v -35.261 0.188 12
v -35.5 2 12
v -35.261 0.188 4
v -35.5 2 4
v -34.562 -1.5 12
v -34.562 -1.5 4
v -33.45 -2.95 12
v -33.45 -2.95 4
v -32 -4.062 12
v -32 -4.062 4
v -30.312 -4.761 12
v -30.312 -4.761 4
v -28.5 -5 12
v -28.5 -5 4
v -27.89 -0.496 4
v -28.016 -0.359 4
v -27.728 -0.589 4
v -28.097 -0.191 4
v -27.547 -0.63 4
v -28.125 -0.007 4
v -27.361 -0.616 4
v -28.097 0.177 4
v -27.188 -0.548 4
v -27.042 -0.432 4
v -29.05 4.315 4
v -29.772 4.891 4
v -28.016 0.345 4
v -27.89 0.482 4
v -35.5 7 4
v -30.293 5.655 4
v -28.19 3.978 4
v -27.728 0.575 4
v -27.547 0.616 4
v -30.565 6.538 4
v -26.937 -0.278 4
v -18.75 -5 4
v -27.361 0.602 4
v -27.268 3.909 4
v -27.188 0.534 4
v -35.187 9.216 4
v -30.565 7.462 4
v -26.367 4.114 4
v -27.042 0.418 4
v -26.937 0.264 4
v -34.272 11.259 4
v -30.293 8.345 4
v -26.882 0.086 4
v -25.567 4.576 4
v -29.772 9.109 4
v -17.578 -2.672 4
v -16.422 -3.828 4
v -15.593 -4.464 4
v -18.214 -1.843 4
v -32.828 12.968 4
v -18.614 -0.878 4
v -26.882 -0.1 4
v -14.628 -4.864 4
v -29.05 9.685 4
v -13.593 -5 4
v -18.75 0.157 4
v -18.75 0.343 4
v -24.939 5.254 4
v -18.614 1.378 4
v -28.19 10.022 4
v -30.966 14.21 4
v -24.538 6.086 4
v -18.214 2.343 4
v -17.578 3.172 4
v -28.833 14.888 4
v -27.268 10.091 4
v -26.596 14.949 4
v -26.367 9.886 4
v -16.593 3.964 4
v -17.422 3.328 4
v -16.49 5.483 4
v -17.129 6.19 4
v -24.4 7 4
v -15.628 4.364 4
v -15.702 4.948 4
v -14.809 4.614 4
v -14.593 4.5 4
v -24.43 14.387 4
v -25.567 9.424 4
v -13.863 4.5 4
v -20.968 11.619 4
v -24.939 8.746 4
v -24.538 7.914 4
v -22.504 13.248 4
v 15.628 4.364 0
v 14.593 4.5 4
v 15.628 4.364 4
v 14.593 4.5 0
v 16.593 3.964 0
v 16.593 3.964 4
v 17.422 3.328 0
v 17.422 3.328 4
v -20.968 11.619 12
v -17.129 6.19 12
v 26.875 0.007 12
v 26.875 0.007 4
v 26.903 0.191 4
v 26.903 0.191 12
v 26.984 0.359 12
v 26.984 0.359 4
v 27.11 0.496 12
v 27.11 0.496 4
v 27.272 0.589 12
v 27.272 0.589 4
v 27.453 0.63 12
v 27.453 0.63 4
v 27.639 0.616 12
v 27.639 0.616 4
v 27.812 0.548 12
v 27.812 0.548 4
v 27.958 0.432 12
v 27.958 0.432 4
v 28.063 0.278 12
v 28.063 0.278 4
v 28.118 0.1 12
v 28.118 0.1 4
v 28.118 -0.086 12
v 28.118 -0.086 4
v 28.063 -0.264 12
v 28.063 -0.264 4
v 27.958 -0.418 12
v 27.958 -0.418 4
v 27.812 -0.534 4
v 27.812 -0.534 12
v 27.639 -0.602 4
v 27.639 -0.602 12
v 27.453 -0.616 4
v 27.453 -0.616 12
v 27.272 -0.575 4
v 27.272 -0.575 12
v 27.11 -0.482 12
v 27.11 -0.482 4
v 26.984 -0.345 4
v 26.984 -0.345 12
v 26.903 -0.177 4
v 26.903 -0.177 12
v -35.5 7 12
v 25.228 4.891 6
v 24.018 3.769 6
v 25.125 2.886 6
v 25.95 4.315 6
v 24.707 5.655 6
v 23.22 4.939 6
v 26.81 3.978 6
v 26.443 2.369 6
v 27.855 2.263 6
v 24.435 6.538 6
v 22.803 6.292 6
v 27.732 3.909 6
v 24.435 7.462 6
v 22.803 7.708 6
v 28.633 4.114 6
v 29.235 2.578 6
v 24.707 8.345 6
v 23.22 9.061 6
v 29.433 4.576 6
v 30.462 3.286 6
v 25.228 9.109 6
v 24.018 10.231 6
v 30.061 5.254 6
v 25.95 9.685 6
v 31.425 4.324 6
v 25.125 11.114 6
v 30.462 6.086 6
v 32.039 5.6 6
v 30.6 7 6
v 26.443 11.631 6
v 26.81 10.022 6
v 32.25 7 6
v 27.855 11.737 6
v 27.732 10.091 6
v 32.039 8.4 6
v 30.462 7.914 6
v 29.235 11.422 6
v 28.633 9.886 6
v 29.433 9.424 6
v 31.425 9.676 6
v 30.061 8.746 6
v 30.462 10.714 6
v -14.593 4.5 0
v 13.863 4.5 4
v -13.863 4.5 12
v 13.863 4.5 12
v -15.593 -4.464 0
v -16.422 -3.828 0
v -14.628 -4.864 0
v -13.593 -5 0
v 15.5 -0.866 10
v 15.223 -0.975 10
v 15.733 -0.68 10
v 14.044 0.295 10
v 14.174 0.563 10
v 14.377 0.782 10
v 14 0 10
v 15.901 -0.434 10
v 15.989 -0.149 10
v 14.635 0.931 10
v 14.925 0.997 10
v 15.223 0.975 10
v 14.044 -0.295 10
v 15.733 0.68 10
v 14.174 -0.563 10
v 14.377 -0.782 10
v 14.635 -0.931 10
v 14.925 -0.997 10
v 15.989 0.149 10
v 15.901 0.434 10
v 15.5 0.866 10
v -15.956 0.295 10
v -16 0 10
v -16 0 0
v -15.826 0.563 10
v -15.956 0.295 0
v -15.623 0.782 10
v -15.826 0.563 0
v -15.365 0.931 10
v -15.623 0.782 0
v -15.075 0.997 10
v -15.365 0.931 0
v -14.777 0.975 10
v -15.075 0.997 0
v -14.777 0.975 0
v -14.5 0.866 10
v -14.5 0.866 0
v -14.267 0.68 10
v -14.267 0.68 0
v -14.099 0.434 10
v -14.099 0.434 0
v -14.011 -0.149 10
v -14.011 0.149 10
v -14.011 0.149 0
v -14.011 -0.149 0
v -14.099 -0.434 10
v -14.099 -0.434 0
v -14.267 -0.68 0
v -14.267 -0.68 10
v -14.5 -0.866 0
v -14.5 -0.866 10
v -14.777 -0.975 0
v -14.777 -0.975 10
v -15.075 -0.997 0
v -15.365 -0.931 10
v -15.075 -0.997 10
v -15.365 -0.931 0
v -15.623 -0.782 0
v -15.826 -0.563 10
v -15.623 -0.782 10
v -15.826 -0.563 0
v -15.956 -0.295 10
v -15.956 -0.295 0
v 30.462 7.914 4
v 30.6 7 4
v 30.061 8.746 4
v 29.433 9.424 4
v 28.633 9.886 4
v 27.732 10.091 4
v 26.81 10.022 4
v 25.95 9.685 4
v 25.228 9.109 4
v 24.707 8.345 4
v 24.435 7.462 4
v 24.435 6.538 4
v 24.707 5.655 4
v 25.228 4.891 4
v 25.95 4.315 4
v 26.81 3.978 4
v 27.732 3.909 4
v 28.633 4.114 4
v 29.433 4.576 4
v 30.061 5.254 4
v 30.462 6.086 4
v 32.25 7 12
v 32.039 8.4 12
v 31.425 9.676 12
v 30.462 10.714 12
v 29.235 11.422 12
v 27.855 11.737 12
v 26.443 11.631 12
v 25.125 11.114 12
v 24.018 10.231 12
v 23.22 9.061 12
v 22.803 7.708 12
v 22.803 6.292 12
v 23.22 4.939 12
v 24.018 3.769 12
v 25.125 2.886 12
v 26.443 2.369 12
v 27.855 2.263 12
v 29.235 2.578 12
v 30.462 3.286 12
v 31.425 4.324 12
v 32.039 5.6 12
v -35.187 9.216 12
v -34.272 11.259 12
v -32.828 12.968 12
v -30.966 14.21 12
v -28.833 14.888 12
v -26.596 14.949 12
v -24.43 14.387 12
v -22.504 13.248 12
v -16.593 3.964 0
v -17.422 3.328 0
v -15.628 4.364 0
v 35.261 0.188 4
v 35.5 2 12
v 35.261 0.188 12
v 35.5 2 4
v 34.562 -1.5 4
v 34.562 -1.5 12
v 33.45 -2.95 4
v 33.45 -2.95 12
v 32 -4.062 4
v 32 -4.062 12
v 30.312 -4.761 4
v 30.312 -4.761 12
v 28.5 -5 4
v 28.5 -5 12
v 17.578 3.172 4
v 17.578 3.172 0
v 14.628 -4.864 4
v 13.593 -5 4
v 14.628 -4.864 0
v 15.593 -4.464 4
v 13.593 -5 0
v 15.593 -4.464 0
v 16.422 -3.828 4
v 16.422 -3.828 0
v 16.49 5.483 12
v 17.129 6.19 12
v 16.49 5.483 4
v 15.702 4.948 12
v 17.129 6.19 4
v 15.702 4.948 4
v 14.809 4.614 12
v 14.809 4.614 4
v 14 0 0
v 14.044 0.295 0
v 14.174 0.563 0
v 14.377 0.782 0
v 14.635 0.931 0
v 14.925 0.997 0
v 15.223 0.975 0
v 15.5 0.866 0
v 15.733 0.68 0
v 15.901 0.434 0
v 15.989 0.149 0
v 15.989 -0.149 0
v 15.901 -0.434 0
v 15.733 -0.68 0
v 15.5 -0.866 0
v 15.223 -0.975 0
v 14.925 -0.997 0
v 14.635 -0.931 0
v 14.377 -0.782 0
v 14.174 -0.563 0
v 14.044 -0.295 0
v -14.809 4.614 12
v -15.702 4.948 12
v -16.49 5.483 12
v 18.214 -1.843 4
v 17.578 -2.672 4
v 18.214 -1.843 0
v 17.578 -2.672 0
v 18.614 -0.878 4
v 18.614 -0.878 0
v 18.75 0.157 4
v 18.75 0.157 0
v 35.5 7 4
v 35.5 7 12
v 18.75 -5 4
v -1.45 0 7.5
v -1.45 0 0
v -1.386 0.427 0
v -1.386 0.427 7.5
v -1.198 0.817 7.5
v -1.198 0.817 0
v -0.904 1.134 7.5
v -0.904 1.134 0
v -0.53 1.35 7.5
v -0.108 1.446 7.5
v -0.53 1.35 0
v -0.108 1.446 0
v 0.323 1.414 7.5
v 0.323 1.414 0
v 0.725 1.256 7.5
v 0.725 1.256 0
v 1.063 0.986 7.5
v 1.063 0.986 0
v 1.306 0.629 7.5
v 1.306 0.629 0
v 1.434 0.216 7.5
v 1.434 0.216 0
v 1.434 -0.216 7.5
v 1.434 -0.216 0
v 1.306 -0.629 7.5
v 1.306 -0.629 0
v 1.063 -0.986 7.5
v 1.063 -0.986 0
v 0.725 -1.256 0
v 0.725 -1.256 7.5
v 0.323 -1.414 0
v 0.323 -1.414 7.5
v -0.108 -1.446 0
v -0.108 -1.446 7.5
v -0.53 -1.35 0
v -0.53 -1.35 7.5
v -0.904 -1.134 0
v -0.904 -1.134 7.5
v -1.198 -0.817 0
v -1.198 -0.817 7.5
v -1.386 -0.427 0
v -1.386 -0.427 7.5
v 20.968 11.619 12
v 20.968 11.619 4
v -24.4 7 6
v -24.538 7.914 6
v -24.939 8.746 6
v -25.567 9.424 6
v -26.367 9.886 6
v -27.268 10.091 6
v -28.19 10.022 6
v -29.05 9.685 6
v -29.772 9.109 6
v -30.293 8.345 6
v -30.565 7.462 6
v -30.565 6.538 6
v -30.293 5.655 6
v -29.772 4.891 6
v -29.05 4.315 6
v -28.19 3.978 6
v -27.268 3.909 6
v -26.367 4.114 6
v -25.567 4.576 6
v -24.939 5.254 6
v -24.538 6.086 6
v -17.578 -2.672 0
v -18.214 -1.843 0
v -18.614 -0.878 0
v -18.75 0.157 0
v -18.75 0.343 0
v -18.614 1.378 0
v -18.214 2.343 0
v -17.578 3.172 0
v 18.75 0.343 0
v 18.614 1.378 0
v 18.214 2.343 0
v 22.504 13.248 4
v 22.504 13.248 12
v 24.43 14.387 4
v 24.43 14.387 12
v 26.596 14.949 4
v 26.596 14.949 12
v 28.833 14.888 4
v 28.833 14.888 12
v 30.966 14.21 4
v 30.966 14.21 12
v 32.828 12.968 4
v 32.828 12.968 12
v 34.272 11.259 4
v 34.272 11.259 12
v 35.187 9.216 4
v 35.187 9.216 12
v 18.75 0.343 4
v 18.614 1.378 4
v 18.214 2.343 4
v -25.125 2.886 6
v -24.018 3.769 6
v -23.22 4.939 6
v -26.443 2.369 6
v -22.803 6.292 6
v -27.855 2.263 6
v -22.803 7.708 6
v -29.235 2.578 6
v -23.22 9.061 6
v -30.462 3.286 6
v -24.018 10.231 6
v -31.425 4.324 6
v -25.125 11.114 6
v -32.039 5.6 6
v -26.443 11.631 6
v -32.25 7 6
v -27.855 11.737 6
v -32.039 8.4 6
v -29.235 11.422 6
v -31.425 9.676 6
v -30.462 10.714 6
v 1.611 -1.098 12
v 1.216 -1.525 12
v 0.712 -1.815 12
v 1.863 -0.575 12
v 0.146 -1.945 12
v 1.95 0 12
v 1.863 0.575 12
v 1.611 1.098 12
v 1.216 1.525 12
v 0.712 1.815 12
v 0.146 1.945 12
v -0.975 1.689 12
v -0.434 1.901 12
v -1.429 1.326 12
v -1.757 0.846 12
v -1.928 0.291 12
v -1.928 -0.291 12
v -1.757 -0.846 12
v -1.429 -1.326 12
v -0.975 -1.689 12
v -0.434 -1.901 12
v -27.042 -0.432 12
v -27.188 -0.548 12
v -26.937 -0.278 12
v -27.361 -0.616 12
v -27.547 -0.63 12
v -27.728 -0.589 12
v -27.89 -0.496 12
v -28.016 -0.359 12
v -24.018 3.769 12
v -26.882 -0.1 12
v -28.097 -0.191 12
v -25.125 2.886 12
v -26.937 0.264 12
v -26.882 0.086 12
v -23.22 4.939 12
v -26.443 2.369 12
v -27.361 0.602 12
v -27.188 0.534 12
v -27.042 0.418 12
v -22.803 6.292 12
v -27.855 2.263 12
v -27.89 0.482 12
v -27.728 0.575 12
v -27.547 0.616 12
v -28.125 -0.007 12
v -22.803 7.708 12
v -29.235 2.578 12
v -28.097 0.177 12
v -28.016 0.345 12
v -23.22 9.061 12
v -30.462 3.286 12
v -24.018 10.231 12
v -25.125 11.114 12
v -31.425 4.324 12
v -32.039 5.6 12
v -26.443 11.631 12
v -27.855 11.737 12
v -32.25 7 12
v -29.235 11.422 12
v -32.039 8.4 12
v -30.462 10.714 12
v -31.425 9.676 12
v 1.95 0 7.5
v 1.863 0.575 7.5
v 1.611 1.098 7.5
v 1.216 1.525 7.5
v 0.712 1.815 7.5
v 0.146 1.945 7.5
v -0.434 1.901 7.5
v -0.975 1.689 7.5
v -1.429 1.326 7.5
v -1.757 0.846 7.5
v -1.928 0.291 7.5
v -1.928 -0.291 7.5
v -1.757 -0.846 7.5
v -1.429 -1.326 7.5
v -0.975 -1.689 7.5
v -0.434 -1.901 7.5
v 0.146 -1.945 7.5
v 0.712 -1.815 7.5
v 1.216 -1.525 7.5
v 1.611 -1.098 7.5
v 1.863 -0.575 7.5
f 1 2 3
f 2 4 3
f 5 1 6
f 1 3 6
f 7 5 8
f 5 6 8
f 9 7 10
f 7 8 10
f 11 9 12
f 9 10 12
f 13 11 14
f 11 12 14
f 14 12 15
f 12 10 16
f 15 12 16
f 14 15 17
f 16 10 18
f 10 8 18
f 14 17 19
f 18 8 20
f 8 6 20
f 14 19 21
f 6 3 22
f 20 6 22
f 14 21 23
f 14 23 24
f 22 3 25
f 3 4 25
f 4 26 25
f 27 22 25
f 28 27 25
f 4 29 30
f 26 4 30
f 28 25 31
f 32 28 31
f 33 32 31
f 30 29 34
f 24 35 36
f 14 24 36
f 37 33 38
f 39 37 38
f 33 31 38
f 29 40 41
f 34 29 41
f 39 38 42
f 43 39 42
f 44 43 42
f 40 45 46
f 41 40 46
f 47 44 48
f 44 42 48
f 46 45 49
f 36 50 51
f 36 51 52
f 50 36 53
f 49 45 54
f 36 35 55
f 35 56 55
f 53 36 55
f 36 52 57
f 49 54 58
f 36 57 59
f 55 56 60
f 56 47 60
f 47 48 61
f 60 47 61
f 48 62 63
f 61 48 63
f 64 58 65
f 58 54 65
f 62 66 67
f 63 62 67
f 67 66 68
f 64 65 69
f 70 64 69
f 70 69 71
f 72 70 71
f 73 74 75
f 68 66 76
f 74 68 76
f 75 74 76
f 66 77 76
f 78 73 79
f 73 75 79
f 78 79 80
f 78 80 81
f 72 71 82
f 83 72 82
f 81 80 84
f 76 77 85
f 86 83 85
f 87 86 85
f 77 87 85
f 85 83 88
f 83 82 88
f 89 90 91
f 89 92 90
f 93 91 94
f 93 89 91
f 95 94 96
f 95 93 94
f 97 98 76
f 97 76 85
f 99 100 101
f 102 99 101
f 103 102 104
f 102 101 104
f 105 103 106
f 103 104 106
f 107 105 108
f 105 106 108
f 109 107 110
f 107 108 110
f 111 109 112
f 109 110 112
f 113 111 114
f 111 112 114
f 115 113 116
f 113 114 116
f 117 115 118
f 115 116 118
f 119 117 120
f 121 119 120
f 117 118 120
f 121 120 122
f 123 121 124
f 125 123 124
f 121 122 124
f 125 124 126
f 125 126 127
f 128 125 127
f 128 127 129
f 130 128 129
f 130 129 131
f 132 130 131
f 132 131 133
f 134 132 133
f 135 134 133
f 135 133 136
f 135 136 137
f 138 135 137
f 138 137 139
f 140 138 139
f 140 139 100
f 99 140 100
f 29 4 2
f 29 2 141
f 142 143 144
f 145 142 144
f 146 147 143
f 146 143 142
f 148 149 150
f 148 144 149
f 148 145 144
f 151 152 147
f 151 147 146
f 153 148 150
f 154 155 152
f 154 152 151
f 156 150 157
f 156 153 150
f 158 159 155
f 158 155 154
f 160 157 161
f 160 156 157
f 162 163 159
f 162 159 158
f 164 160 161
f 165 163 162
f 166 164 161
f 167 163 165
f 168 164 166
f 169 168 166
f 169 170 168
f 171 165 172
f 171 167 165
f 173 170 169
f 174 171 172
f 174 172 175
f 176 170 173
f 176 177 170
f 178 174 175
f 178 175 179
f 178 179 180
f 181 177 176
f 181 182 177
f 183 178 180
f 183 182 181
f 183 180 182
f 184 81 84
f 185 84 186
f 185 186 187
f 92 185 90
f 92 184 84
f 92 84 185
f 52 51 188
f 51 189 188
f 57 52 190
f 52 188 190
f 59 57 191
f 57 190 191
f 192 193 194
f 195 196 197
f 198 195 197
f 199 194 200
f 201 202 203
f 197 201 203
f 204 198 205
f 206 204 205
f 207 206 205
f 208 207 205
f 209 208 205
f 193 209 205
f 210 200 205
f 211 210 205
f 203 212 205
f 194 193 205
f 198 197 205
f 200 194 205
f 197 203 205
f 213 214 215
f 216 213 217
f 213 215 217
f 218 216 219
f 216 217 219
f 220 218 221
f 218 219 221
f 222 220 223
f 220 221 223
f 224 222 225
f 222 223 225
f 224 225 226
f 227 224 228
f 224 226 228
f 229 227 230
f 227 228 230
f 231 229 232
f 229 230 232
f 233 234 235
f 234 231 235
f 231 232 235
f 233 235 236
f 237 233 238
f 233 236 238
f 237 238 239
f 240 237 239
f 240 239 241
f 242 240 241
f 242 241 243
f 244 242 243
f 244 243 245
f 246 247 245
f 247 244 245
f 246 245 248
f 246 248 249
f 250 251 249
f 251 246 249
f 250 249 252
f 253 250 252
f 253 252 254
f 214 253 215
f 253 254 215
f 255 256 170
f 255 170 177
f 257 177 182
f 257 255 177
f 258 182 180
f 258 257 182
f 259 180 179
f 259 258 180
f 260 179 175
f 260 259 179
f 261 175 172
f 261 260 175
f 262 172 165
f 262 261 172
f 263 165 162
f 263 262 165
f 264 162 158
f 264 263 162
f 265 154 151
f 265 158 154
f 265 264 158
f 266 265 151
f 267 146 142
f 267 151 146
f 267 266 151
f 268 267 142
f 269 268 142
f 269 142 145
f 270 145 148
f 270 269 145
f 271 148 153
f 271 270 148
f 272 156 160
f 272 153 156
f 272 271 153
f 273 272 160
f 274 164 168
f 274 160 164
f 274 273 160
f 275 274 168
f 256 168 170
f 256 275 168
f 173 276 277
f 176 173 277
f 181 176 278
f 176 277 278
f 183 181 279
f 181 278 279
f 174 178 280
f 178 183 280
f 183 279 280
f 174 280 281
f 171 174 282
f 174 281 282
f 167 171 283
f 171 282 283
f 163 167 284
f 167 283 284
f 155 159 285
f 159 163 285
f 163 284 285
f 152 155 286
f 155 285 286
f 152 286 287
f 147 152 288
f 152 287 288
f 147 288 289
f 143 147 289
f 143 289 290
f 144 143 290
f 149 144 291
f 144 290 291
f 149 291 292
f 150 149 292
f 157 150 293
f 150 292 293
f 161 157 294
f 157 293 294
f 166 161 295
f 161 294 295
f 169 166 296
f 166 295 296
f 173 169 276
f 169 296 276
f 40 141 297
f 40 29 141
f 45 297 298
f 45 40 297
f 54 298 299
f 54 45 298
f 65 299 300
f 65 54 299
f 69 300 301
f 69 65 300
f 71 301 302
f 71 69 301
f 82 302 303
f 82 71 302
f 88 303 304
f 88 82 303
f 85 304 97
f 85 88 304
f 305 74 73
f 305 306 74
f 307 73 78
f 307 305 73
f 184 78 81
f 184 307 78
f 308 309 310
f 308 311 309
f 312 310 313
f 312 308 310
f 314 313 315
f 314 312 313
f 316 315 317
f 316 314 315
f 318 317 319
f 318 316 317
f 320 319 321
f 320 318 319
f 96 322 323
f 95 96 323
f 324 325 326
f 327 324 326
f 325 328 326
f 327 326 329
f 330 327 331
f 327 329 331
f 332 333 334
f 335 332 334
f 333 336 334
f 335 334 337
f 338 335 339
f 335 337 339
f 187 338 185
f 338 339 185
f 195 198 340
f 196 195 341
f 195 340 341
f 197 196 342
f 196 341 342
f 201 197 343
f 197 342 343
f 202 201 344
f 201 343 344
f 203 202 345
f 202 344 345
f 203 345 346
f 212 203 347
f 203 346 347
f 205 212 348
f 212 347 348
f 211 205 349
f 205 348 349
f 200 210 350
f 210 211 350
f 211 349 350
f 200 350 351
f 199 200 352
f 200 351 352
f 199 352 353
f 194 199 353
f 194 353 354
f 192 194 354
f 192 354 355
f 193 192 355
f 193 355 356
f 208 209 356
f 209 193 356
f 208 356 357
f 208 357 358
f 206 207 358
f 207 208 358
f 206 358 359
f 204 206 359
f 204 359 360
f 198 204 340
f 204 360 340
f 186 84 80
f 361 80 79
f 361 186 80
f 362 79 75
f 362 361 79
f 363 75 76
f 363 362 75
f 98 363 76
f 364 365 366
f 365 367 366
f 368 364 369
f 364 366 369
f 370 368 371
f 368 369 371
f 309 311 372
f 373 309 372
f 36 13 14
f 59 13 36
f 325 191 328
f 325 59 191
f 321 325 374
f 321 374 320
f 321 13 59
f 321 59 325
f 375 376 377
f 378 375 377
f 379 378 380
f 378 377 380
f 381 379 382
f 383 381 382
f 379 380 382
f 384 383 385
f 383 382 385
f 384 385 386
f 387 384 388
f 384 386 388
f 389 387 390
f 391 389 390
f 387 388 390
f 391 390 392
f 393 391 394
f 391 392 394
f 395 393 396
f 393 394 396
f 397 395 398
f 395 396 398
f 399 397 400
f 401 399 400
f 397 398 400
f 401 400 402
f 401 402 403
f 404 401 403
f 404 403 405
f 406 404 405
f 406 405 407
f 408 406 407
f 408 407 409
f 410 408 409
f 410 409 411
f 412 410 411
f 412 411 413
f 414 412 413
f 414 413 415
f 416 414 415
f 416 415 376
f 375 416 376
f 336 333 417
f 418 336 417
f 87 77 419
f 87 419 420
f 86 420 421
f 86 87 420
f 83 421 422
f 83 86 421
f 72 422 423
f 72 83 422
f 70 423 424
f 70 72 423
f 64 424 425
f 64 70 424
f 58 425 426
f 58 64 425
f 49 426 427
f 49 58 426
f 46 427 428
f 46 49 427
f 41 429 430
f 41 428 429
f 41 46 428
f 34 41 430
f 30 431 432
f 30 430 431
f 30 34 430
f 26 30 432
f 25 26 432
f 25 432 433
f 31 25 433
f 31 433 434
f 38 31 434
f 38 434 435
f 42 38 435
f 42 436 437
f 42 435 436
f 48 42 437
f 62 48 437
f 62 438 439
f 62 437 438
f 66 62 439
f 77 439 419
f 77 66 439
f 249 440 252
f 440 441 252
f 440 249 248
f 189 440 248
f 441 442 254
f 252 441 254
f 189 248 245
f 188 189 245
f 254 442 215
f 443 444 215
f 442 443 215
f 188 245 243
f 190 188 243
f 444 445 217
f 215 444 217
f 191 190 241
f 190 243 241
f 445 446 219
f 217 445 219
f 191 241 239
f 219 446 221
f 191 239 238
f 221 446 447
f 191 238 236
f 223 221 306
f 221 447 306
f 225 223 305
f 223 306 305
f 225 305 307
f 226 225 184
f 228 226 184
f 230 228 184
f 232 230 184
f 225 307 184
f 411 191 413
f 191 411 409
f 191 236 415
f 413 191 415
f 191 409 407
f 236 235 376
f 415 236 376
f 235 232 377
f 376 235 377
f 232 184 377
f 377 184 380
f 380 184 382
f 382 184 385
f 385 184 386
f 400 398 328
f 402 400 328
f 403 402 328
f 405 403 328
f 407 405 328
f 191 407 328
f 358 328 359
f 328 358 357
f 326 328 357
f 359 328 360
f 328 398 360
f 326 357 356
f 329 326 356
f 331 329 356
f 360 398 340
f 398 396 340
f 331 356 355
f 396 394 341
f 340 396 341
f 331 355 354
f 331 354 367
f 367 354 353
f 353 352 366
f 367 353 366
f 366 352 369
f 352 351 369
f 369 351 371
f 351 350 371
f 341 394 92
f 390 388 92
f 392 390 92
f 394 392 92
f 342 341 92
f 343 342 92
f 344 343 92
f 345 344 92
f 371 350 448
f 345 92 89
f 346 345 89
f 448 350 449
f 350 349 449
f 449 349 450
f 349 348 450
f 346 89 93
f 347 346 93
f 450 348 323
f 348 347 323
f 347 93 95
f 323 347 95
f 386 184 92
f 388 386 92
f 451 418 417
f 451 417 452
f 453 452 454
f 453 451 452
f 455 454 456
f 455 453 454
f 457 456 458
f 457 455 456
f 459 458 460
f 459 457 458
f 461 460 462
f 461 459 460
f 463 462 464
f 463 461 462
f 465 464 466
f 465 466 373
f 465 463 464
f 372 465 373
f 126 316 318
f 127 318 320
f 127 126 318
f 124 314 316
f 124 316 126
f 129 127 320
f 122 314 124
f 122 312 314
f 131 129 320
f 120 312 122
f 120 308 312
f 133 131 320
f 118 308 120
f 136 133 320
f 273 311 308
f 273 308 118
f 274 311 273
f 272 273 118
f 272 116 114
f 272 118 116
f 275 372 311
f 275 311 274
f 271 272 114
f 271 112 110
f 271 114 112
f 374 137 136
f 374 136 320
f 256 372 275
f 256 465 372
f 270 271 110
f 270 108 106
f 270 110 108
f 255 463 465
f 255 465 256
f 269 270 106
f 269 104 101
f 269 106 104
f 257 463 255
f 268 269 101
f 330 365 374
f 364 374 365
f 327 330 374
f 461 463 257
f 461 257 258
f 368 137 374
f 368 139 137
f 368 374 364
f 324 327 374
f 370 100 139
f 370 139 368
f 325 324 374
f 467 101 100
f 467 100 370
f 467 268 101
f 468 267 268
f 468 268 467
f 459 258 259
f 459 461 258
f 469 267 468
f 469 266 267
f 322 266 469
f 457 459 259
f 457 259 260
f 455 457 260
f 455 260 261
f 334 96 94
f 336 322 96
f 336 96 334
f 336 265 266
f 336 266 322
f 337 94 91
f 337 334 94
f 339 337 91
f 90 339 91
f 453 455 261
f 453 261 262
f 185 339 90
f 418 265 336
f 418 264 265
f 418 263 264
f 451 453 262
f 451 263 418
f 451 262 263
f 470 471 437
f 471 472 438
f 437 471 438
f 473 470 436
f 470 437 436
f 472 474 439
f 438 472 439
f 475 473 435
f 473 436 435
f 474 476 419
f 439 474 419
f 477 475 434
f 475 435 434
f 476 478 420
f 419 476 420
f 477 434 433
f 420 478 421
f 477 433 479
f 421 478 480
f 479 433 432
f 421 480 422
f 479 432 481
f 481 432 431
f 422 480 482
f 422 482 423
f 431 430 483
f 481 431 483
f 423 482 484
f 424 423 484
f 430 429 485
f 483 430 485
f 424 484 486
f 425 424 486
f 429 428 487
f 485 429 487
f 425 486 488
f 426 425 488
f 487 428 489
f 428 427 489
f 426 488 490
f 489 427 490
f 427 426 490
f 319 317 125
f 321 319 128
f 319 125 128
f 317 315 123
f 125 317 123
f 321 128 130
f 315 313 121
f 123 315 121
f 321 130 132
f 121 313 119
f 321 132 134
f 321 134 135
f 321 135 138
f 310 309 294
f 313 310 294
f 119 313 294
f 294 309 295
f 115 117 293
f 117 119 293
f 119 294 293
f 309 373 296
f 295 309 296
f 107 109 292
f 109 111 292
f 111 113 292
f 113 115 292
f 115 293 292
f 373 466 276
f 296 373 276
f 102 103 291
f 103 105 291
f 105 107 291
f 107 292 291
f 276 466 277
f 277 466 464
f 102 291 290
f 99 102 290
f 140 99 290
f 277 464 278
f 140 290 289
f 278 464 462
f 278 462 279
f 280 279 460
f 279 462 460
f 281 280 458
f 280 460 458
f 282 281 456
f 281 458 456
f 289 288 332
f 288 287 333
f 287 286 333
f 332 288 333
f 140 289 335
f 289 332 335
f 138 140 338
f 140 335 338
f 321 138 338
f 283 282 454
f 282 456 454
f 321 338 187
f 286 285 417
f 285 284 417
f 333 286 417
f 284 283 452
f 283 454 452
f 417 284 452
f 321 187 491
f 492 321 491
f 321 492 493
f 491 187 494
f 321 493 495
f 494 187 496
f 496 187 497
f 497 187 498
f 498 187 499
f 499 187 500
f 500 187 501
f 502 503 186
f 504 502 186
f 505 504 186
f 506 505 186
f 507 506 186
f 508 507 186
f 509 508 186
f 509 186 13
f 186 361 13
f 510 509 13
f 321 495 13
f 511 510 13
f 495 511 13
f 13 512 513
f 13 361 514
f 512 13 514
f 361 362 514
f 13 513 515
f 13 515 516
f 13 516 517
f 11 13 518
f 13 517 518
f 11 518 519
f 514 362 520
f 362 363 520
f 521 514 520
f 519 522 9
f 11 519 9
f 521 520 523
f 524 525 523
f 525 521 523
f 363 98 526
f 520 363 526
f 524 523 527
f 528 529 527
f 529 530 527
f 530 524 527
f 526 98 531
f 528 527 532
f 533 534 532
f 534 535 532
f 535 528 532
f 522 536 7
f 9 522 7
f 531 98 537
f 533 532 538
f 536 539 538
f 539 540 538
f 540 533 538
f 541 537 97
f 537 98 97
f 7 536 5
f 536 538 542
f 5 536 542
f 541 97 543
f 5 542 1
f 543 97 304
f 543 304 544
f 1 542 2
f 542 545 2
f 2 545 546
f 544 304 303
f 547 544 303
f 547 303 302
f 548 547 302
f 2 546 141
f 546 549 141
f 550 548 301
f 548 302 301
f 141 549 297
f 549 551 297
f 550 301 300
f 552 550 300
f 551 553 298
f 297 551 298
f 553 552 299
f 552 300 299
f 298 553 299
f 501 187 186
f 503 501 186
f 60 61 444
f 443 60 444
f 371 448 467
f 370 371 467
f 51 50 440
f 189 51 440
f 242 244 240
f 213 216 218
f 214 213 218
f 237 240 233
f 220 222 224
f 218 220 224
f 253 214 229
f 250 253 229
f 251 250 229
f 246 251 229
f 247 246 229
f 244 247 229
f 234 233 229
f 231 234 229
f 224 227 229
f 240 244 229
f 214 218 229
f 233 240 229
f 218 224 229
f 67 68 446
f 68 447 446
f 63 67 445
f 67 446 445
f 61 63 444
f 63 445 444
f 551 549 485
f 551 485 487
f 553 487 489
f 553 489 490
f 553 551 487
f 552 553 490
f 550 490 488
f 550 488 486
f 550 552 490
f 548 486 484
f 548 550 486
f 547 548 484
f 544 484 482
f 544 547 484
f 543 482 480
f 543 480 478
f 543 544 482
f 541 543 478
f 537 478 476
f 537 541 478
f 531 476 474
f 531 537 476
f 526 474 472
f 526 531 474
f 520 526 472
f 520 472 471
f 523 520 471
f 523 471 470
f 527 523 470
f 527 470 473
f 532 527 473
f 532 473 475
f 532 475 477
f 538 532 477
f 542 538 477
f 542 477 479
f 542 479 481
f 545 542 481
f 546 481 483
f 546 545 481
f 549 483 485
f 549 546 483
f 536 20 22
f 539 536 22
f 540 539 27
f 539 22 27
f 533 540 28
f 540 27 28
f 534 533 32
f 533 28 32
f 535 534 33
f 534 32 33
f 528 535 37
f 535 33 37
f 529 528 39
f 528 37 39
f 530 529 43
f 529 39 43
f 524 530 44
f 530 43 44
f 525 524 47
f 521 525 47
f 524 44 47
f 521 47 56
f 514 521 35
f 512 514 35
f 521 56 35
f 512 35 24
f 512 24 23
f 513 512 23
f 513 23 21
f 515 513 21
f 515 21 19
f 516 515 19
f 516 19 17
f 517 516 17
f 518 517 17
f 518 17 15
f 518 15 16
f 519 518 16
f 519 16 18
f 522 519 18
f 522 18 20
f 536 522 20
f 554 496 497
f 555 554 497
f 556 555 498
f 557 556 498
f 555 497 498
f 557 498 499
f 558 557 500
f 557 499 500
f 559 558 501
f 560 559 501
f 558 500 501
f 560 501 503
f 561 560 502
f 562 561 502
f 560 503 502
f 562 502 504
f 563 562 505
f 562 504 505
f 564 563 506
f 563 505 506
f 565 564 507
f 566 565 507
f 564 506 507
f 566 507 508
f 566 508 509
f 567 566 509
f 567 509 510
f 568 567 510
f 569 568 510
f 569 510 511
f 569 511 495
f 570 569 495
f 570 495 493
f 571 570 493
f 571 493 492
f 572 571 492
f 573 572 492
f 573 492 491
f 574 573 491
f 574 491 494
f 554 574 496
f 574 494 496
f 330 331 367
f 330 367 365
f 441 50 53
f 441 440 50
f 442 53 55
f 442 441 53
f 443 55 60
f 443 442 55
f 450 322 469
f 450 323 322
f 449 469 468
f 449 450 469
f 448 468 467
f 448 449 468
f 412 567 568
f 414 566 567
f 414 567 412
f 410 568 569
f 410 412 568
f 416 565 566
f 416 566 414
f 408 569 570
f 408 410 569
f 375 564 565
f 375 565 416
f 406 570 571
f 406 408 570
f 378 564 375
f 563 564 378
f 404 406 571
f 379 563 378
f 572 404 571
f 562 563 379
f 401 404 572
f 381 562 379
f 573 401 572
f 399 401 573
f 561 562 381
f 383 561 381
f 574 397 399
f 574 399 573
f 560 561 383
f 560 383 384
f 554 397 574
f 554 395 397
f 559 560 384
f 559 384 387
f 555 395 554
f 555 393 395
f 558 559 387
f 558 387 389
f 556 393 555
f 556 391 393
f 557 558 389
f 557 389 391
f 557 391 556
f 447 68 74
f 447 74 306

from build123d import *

# Parameters (mm, degrees)
SKETCH1_W                     = 68.5
SKETCH1_H                     = 7
BOSS_EXTRUDE1_DEPTH           = 12
BOSS_EXTRUDE1_DEPTH_BACK      = 12
SKETCH2_W                     = 15.5
SKETCH2_H                     = 6.3
CUT_EXTRUDE1_DEPTH            = 8
SKETCH3_W                     = 13.5
SKETCH3_H                     = 8.85
BOSS_EXTRUDE2_DEPTH           = 10
SKETCH4_R                     = 3.1
CUT_EXTRUDE2_DEPTH            = 22
CUT_EXTRUDE2_DEPTH_BACK       = 24.5
CUT_EXTRUDE3_DEPTH            = 5
SKETCH6_R                     = 6.2
CUT_EXTRUDE4_DEPTH            = 1
MIRROR2_COPY_1_SKETCH_R       = 6.2
MIRROR2_COPY_1_DEPTH          = 1
SKETCH7_W                     = 13.5
SKETCH7_H                     = 8.5
CUT_EXTRUDE5_DEPTH            = 1
MIRROR5_COPY_1_SKETCH_W       = 13.5
MIRROR5_COPY_1_SKETCH_H       = 8.5
MIRROR5_COPY_1_DEPTH          = 1
TAP_DRILL_FOR_M2_TAP1_D       = 1.6
CUT_EXTRUDE6_DEPTH            = 27
SKETCH12_W                    = 73.606041854
SKETCH12_H                    = 30.436261762
CUT_EXTRUDE7_DEPTH            = 22
F_2_0_2_DIAMETER_HOLE2_D      = 2
F_2_0_2_DIAMETER_HOLE2_DEPTH  = 16
F_2_0_2_DIAMETER_HOLE2_TIP    = 0.600860619
F_2_0_2_DIAMETER_HOLE1_D      = 2
F_2_0_2_DIAMETER_HOLE1_DEPTH  = 16
F_2_0_2_DIAMETER_HOLE1_TIP    = 0.600860619
ESQUISSE5_R                   = 3.1
BOSS_EXTRU_1_DEPTH            = 1
ESQUISSE6_R                   = 4.75
ENL_V_MAT_EXTRU_1_DEPTH       = 6
ESQUISSE7_R                   = 0.8
BOSS_EXTRU_2_DEPTH            = 8.85
ESQUISSE9_R                   = 0.6
ENL_V_MAT_EXTRU_2_DEPTH       = 13
BOSS_EXTRUDE3_DEPTH           = 1.5
SKETCH24_W                    = 17.102440496
SKETCH24_H                    = 20.071516443
CUT_EXTRUDE8_DEPTH            = 0.85
BOSS_EXTRUDE4_DEPTH           = 8
M2_5_CLEARANCE_HOLE1_D        = 2.9
M2_5_CLEARANCE_HOLE1_DEPTH    = 24
M2_5_CLEARANCE_HOLE1_TIP      = 0.871247898
SKETCH26_W                    = 37.5
SKETCH26_H                    = 12
BOSS_EXTRUDE6_DEPTH           = 1
SKETCH27_R                    = 1.95
CUT_EXTRUDE9_DEPTH            = 4.5
CHAMFER2_SIZE                 = 2.5
SKETCH28_R                    = 1
BOSS_EXTRUDE7_DEPTH           = 2
SKETCH29_R                    = 8
SKETCH29_R_2                  = 4.75
BOSS_EXTRUDE8_DEPTH           = 8
SKETCH31_W                    = 1.25
SKETCH31_H                    = 12
BOSS_EXTRUDE9_DEPTH           = 8
FILLET1_R                     = 7
BOSS_EXTRUDE10_DEPTH          = 8
FILLET2_R                     = 4
TAP_DRILL_FOR_M1_6_TAP1_D     = 1.25
TAP_DRILL_FOR_M1_6_TAP1_DEPTH = 30.5
CHAMFER3_SIZE                 = 3.5
FILLET3_R                     = 4


with BuildPart() as part:
    # Sketch1 → Boss-Extrude1 (new body, two sides)
    with BuildSketch(Plane.XY) as boss_extrude1_sk:
        Rectangle(SKETCH1_W, SKETCH1_H)
    extrude(amount=BOSS_EXTRUDE1_DEPTH)
    extrude(boss_extrude1_sk.sketch, amount=-BOSS_EXTRUDE1_DEPTH_BACK)

    # Sketch2 → Cut-Extrude1 (cut, through all)
    with BuildSketch(Plane(origin=(0, 3.5, 0), x_dir=(1, 0, 0), z_dir=(0, 1, 0))):
        with Locations((-26.5, 0)):
            Rectangle(SKETCH2_W, SKETCH2_H)
        with Locations((26.5, 0)):
            Rectangle(SKETCH2_W, SKETCH2_H)
    extrude(amount=-CUT_EXTRUDE1_DEPTH, mode=Mode.SUBTRACT)

    # Sketch3 → Boss-Extrude2 (add)
    with BuildSketch(Plane(origin=(0, 3.5, 0), x_dir=(1, 0, 0), z_dir=(0, 1, 0))):
        with Locations((-27.5, 7.575)):
            Rectangle(SKETCH3_W, SKETCH3_H)
        with Locations((-27.5, -7.575)):
            Rectangle(SKETCH3_W, SKETCH3_H)
        with Locations((27.5, -7.575)):
            Rectangle(SKETCH3_W, SKETCH3_H)
        with Locations((27.5, 7.575)):
            Rectangle(SKETCH3_W, SKETCH3_H)
    extrude(amount=BOSS_EXTRUDE2_DEPTH)

    # Sketch4 → Cut-Extrude2 (cut, two sides)
    with BuildSketch(Plane.XY) as cut_extrude2_sk:
        with Locations((-27.5, 7)):
            Circle(SKETCH4_R)
        with Locations((27.5, 7)):
            Circle(SKETCH4_R)
    extrude(amount=CUT_EXTRUDE2_DEPTH, mode=Mode.SUBTRACT)
    extrude(cut_extrude2_sk.sketch, amount=-CUT_EXTRUDE2_DEPTH_BACK, mode=Mode.SUBTRACT)

    # Sketch5 → Cut-Extrude3 (cut)
    with BuildSketch(Plane.XY):
        Polygon((15, 3.5), (36.256888292, -2.195766051), (36.256888292, 13.5), (15, 13.5), align=None)
    extrude(amount=-CUT_EXTRUDE3_DEPTH, mode=Mode.SUBTRACT)

    # Sketch6 → Cut-Extrude4 (cut)
    with BuildSketch(Plane.XY.offset(12)):
        with Locations((27.5, 7)):
            Circle(SKETCH6_R)
    cut_extrude4 = extrude(amount=-CUT_EXTRUDE4_DEPTH, mode=Mode.SUBTRACT)

    # Mirror1: Cut-Extrude4 across plane
    add(cut_extrude4.mirror(Plane.XY), mode=Mode.SUBTRACT)

    # Mirror2: Cut-Extrude4 across plane
    add(cut_extrude4.mirror(Plane(origin=(0, 0, 0), x_dir=(0, 0, 1), z_dir=(1, 0, 0))), mode=Mode.SUBTRACT)

    # Mirror2 copy 1 sketch → Mirror2 copy 1 (cut)
    with BuildSketch(Plane(origin=(0, 0, -12), x_dir=(-1, 0, 0), z_dir=(0, 0, -1))):
        with Locations((27.5, 7)):
            Circle(MIRROR2_COPY_1_SKETCH_R)
    extrude(amount=-MIRROR2_COPY_1_DEPTH, mode=Mode.SUBTRACT)

    # Sketch7 → Cut-Extrude5 (cut)
    with BuildSketch(Plane.XY.offset(12)):
        with Locations((-27.5, 9.25)):
            Rectangle(SKETCH7_W, SKETCH7_H)
    cut_extrude5 = extrude(amount=-CUT_EXTRUDE5_DEPTH, mode=Mode.SUBTRACT)

    # Mirror3: Cut-Extrude5 across plane
    add(cut_extrude5.mirror(Plane(origin=(0, 0, 0), x_dir=(0, 0, 1), z_dir=(1, 0, 0))), mode=Mode.SUBTRACT)

    # Mirror5: Cut-Extrude5 across plane
    add(cut_extrude5.mirror(Plane.XY), mode=Mode.SUBTRACT)

    # Mirror5 copy 1 sketch → Mirror5 copy 1 (cut)
    with BuildSketch(Plane(origin=(0, 0, -12), x_dir=(-1, 0, 0), z_dir=(0, 0, -1))):
        with Locations((-27.5, 9.25)):
            Rectangle(MIRROR5_COPY_1_SKETCH_W, MIRROR5_COPY_1_SKETCH_H)
    extrude(amount=-MIRROR5_COPY_1_DEPTH, mode=Mode.SUBTRACT)

    # Tap Drill for M2 Tap1 (through all)
    with Locations(Plane.XY.offset(12)):
        with Locations((-25, 0), (0, 0), (25, 0)):
            Hole(TAP_DRILL_FOR_M2_TAP1_D / 2)

    # Sketch11 → Cut-Extrude6 (cut)
    with BuildSketch(Plane.XY.offset(12)):
        with BuildLine():
            Line((-34.25, 7), (-34.25, 21.221242017))
            Line((-34.25, 21.221242017), (-20.75, 21.221242017))
            Line((-20.75, 21.221242017), (-20.75, 7))
            ThreePointArc((-20.75, 7), (-27.5, 13.75), (-34.25, 7))
        make_face()
    cut_extrude6 = extrude(amount=-CUT_EXTRUDE6_DEPTH, mode=Mode.SUBTRACT)

    # Mirror6: Cut-Extrude6 across plane
    add(cut_extrude6.mirror(Plane(origin=(0, 0, 0), x_dir=(0, 0, 1), z_dir=(1, 0, 0))), mode=Mode.SUBTRACT)

    # Sketch12 → Cut-Extrude7 (cut)
    with BuildSketch(Plane.XY):
        Rectangle(SKETCH12_W, SKETCH12_H)
    extrude(amount=-CUT_EXTRUDE7_DEPTH, mode=Mode.SUBTRACT)

    # 2.0 _2_ Diameter Hole2
    with Locations(Plane.XY.offset(12)):
        with Locations((-15, 0)):
            Hole(F_2_0_2_DIAMETER_HOLE2_D / 2, depth=F_2_0_2_DIAMETER_HOLE2_DEPTH)
            with Locations((0, 0, -(F_2_0_2_DIAMETER_HOLE2_DEPTH + F_2_0_2_DIAMETER_HOLE2_TIP / 2))):  # 118° drill point
                Cone(0, F_2_0_2_DIAMETER_HOLE2_D / 2, F_2_0_2_DIAMETER_HOLE2_TIP, mode=Mode.SUBTRACT)

    # 2.0 _2_ Diameter Hole1
    with Locations(Plane.XY.offset(12)):
        with Locations((15, 0)):
            Hole(F_2_0_2_DIAMETER_HOLE1_D / 2, depth=F_2_0_2_DIAMETER_HOLE1_DEPTH)
            with Locations((0, 0, -(F_2_0_2_DIAMETER_HOLE1_DEPTH + F_2_0_2_DIAMETER_HOLE1_TIP / 2))):  # 118° drill point
                Cone(0, F_2_0_2_DIAMETER_HOLE1_D / 2, F_2_0_2_DIAMETER_HOLE1_TIP, mode=Mode.SUBTRACT)

    # Esquisse5 → Boss.-Extru.1 (add)
    with BuildSketch(Plane.XY.offset(11)):
        with BuildLine():
            Line((20.75, 5), (21.6314397, 5))
            ThreePointArc((21.6314397, 5), (27.5, 0.8), (33.3685603, 5))
            Line((33.3685603, 5), (34.25, 5))
            Line((34.25, 5), (34.25, 7))
            ThreePointArc((34.25, 7), (32.878089133, 11.079051027), (29.320027472, 13.5))
            Line((29.320027472, 13.5), (25.679972528, 13.5))
            ThreePointArc((25.679972528, 13.5), (22.121910867, 11.079051027), (20.75, 7))
            Line((20.75, 7), (20.75, 5))
        make_face()
        with Locations((27.5, 7)):
            Circle(ESQUISSE5_R, mode=Mode.SUBTRACT)
    boss_extru_1 = extrude(amount=BOSS_EXTRU_1_DEPTH)

    # Esquisse6 → Enl_v. mat.-Extru.1 (cut)
    with BuildSketch(Plane.XY.offset(12)):
        with Locations((27.5, 7)):
            Circle(ESQUISSE6_R)
    enl_v_mat_extru_1 = extrude(amount=-ENL_V_MAT_EXTRU_1_DEPTH, mode=Mode.SUBTRACT)

    # Sym_trie1: Boss.-Extru.1, Enl_v. mat.-Extru.1 across plane
    add(boss_extru_1.mirror(Plane(origin=(0, 0, 0), x_dir=(0, 0, 1), z_dir=(1, 0, 0))))
    add(enl_v_mat_extru_1.mirror(Plane(origin=(0, 0, 0), x_dir=(0, 0, 1), z_dir=(1, 0, 0))), mode=Mode.SUBTRACT)

    # Esquisse7 → Boss.-Extru.2 (add)
    with BuildSketch(Plane.XY.offset(12)):
        with Locations((-25, 0)):
            Circle(ESQUISSE7_R)
        with Locations((25, 0)):
            Circle(ESQUISSE7_R)
    extrude(amount=-BOSS_EXTRU_2_DEPTH)

    # Esquisse9 → Enl_v. mat.-Extru.2 (cut, through all)
    with BuildSketch(Plane.XY.offset(12)):
        with Locations((27.5, 0)):
            Circle(ESQUISSE9_R)
        with Locations((-27.5, 0)):
            Circle(ESQUISSE9_R)
    extrude(amount=-ENL_V_MAT_EXTRU_2_DEPTH, mode=Mode.SUBTRACT)

    # Sketch18 → Boss-Extrude3 (add)
    with BuildSketch(Plane.XZ.offset(3.5)):
        Polygon((-18.75, 0), (18.75, 0), (18.75, 3.15), (34.25, 3.15), (34.25, 12), (-34.25, 12), (-34.25, 3.15), (-18.75, 3.15), align=None)
    extrude(amount=BOSS_EXTRUDE3_DEPTH)

    # Sketch24 → Cut-Extrude8 (cut)
    with BuildSketch(Plane(origin=(0, 0, 3.15), x_dir=(-1, 0, 0), z_dir=(0, 0, -1))):
        with Locations((-27.301220248, 5.035758222)):
            Rectangle(SKETCH24_W, SKETCH24_H)
        with Locations((27.301220248, 5.035758222)):
            Rectangle(SKETCH24_W, SKETCH24_H)
    extrude(amount=-CUT_EXTRUDE8_DEPTH, mode=Mode.SUBTRACT)

    # Sketch19 → Boss-Extrude4 (add)
    with BuildSketch(Plane(origin=(0, 0, 4), x_dir=(-1, 0, 0), z_dir=(0, 0, -1))):
        Polygon((22.565408914, 11.605682449), (15, 3.5), (20.75, 3.5), align=None)
        Polygon((-20.75, 3.5), (-15, 3.5), (-22.565408914, 11.605682449), align=None)
    extrude(amount=-BOSS_EXTRUDE4_DEPTH)

    # M2.5 Clearance Hole1
    with Locations(Plane.XY.offset(12)):
        with Locations((0, 0)):
            Hole(M2_5_CLEARANCE_HOLE1_D / 2, depth=M2_5_CLEARANCE_HOLE1_DEPTH)
            with Locations((0, 0, -(M2_5_CLEARANCE_HOLE1_DEPTH + M2_5_CLEARANCE_HOLE1_TIP / 2))):  # 118° drill point
                Cone(0, M2_5_CLEARANCE_HOLE1_D / 2, M2_5_CLEARANCE_HOLE1_TIP, mode=Mode.SUBTRACT)

    # Sketch26 → Boss-Extrude6 (add)
    with BuildSketch(Plane(origin=(0, 3.5, 0), x_dir=(1, 0, 0), z_dir=(0, 1, 0))):
        with Locations((0, -6)):
            Rectangle(SKETCH26_W, SKETCH26_H)
    extrude(amount=BOSS_EXTRUDE6_DEPTH)

    # Sketch27 → Cut-Extrude9 (cut)
    with BuildSketch(Plane.XY.offset(12)):
        Circle(SKETCH27_R)
    extrude(amount=-CUT_EXTRUDE9_DEPTH, mode=Mode.SUBTRACT)

    # Chamfer2
    chamfer2_edges = [part.edges().sort_by_distance(p)[0] for p in [
        (-18.75, 4.5, 2),
        (18.75, 4.5, 2),
    ]]
    chamfer(chamfer2_edges, length=CHAMFER2_SIZE)

    # Sketch28 → Boss-Extrude7 (add)
    with BuildSketch(Plane.XY.offset(12)):
        with Locations((-15, 0)):
            Circle(SKETCH28_R)
        with Locations((15, 0)):
            Circle(SKETCH28_R)
    extrude(amount=-BOSS_EXTRUDE7_DEPTH)

    # Sketch29 → Boss-Extrude8 (add)
    with BuildSketch(Plane(origin=(0, 0, 4), x_dir=(-1, 0, 0), z_dir=(0, 0, -1))):
        with Locations((27.5, 7)):
            Circle(SKETCH29_R)
        with Locations((27.5, 7)):
            Circle(SKETCH29_R_2, mode=Mode.SUBTRACT)
        with Locations((-27.5, 7)):
            Circle(SKETCH29_R)
        with Locations((-27.5, 7)):
            Circle(SKETCH29_R_2, mode=Mode.SUBTRACT)
    extrude(amount=-BOSS_EXTRUDE8_DEPTH)

    # Sketch31 → Boss-Extrude9 (add)
    with BuildSketch(Plane.XY.offset(12)):
        with Locations((-34.875, 1)):
            Rectangle(SKETCH31_W, SKETCH31_H)
        with Locations((34.875, 1)):
            Rectangle(SKETCH31_W, SKETCH31_H)
    extrude(amount=-BOSS_EXTRUDE9_DEPTH)

    # Fillet1
    fillet1_edges = [part.edges().sort_by_distance(p)[0] for p in [
        (-35.5, -5, 8),
        (35.5, -5, 8),
    ]]
    fillet(fillet1_edges, radius=FILLET1_R)

    # Sketch32 → Boss-Extrude10 (add)
    with BuildSketch(Plane(origin=(0, 0, 4), x_dir=(-1, 0, 0), z_dir=(0, 0, -1))):
        Polygon((-15.933346324, 4.5), (-20.968428631, 11.619369595), (-19.635586921, 8.466631145), align=None)
        Polygon((19.635586921, 8.466631145), (15.933346324, 4.5), (20.968428631, 11.619369595), align=None)
    extrude(amount=-BOSS_EXTRUDE10_DEPTH)

    # Fillet2
    fillet2_edges = [part.edges().sort_by_distance(p)[0] for p in [
        (15.933346324, 4.5, 8),
        (-15.933346324, 4.5, 8),
    ]]
    fillet(fillet2_edges, radius=FILLET2_R)

    # Tap Drill for M1.6 Tap1
    with Locations(Plane.XY.offset(12)):
        with Locations((-27.500000011, -0.006912425), (27.499997471, 0.006912424)):
            Hole(TAP_DRILL_FOR_M1_6_TAP1_D / 2, depth=TAP_DRILL_FOR_M1_6_TAP1_DEPTH)

    # Chamfer3
    chamfer3_edges = [part.edges().sort_by_distance(p)[0] for p in [
        (-18.75, -5, 2),
        (18.75, -5, 2),
    ]]
    chamfer(chamfer3_edges, length=CHAMFER3_SIZE)

    # Fillet3
    fillet3_edges = [part.edges().sort_by_distance(p)[0] for p in [
        (-16.25, 4.5, 2),
        (16.25, 4.5, 2),
        (18.75, 2, 2),
        (-18.75, 2, 2),
        (15.25, -5, 2),
        (-15.25, -5, 2),
        (-18.75, -1.5, 2),
        (18.75, -1.5, 2),
    ]]
    fillet(fillet3_edges, radius=FILLET3_R)


solid = part.part
